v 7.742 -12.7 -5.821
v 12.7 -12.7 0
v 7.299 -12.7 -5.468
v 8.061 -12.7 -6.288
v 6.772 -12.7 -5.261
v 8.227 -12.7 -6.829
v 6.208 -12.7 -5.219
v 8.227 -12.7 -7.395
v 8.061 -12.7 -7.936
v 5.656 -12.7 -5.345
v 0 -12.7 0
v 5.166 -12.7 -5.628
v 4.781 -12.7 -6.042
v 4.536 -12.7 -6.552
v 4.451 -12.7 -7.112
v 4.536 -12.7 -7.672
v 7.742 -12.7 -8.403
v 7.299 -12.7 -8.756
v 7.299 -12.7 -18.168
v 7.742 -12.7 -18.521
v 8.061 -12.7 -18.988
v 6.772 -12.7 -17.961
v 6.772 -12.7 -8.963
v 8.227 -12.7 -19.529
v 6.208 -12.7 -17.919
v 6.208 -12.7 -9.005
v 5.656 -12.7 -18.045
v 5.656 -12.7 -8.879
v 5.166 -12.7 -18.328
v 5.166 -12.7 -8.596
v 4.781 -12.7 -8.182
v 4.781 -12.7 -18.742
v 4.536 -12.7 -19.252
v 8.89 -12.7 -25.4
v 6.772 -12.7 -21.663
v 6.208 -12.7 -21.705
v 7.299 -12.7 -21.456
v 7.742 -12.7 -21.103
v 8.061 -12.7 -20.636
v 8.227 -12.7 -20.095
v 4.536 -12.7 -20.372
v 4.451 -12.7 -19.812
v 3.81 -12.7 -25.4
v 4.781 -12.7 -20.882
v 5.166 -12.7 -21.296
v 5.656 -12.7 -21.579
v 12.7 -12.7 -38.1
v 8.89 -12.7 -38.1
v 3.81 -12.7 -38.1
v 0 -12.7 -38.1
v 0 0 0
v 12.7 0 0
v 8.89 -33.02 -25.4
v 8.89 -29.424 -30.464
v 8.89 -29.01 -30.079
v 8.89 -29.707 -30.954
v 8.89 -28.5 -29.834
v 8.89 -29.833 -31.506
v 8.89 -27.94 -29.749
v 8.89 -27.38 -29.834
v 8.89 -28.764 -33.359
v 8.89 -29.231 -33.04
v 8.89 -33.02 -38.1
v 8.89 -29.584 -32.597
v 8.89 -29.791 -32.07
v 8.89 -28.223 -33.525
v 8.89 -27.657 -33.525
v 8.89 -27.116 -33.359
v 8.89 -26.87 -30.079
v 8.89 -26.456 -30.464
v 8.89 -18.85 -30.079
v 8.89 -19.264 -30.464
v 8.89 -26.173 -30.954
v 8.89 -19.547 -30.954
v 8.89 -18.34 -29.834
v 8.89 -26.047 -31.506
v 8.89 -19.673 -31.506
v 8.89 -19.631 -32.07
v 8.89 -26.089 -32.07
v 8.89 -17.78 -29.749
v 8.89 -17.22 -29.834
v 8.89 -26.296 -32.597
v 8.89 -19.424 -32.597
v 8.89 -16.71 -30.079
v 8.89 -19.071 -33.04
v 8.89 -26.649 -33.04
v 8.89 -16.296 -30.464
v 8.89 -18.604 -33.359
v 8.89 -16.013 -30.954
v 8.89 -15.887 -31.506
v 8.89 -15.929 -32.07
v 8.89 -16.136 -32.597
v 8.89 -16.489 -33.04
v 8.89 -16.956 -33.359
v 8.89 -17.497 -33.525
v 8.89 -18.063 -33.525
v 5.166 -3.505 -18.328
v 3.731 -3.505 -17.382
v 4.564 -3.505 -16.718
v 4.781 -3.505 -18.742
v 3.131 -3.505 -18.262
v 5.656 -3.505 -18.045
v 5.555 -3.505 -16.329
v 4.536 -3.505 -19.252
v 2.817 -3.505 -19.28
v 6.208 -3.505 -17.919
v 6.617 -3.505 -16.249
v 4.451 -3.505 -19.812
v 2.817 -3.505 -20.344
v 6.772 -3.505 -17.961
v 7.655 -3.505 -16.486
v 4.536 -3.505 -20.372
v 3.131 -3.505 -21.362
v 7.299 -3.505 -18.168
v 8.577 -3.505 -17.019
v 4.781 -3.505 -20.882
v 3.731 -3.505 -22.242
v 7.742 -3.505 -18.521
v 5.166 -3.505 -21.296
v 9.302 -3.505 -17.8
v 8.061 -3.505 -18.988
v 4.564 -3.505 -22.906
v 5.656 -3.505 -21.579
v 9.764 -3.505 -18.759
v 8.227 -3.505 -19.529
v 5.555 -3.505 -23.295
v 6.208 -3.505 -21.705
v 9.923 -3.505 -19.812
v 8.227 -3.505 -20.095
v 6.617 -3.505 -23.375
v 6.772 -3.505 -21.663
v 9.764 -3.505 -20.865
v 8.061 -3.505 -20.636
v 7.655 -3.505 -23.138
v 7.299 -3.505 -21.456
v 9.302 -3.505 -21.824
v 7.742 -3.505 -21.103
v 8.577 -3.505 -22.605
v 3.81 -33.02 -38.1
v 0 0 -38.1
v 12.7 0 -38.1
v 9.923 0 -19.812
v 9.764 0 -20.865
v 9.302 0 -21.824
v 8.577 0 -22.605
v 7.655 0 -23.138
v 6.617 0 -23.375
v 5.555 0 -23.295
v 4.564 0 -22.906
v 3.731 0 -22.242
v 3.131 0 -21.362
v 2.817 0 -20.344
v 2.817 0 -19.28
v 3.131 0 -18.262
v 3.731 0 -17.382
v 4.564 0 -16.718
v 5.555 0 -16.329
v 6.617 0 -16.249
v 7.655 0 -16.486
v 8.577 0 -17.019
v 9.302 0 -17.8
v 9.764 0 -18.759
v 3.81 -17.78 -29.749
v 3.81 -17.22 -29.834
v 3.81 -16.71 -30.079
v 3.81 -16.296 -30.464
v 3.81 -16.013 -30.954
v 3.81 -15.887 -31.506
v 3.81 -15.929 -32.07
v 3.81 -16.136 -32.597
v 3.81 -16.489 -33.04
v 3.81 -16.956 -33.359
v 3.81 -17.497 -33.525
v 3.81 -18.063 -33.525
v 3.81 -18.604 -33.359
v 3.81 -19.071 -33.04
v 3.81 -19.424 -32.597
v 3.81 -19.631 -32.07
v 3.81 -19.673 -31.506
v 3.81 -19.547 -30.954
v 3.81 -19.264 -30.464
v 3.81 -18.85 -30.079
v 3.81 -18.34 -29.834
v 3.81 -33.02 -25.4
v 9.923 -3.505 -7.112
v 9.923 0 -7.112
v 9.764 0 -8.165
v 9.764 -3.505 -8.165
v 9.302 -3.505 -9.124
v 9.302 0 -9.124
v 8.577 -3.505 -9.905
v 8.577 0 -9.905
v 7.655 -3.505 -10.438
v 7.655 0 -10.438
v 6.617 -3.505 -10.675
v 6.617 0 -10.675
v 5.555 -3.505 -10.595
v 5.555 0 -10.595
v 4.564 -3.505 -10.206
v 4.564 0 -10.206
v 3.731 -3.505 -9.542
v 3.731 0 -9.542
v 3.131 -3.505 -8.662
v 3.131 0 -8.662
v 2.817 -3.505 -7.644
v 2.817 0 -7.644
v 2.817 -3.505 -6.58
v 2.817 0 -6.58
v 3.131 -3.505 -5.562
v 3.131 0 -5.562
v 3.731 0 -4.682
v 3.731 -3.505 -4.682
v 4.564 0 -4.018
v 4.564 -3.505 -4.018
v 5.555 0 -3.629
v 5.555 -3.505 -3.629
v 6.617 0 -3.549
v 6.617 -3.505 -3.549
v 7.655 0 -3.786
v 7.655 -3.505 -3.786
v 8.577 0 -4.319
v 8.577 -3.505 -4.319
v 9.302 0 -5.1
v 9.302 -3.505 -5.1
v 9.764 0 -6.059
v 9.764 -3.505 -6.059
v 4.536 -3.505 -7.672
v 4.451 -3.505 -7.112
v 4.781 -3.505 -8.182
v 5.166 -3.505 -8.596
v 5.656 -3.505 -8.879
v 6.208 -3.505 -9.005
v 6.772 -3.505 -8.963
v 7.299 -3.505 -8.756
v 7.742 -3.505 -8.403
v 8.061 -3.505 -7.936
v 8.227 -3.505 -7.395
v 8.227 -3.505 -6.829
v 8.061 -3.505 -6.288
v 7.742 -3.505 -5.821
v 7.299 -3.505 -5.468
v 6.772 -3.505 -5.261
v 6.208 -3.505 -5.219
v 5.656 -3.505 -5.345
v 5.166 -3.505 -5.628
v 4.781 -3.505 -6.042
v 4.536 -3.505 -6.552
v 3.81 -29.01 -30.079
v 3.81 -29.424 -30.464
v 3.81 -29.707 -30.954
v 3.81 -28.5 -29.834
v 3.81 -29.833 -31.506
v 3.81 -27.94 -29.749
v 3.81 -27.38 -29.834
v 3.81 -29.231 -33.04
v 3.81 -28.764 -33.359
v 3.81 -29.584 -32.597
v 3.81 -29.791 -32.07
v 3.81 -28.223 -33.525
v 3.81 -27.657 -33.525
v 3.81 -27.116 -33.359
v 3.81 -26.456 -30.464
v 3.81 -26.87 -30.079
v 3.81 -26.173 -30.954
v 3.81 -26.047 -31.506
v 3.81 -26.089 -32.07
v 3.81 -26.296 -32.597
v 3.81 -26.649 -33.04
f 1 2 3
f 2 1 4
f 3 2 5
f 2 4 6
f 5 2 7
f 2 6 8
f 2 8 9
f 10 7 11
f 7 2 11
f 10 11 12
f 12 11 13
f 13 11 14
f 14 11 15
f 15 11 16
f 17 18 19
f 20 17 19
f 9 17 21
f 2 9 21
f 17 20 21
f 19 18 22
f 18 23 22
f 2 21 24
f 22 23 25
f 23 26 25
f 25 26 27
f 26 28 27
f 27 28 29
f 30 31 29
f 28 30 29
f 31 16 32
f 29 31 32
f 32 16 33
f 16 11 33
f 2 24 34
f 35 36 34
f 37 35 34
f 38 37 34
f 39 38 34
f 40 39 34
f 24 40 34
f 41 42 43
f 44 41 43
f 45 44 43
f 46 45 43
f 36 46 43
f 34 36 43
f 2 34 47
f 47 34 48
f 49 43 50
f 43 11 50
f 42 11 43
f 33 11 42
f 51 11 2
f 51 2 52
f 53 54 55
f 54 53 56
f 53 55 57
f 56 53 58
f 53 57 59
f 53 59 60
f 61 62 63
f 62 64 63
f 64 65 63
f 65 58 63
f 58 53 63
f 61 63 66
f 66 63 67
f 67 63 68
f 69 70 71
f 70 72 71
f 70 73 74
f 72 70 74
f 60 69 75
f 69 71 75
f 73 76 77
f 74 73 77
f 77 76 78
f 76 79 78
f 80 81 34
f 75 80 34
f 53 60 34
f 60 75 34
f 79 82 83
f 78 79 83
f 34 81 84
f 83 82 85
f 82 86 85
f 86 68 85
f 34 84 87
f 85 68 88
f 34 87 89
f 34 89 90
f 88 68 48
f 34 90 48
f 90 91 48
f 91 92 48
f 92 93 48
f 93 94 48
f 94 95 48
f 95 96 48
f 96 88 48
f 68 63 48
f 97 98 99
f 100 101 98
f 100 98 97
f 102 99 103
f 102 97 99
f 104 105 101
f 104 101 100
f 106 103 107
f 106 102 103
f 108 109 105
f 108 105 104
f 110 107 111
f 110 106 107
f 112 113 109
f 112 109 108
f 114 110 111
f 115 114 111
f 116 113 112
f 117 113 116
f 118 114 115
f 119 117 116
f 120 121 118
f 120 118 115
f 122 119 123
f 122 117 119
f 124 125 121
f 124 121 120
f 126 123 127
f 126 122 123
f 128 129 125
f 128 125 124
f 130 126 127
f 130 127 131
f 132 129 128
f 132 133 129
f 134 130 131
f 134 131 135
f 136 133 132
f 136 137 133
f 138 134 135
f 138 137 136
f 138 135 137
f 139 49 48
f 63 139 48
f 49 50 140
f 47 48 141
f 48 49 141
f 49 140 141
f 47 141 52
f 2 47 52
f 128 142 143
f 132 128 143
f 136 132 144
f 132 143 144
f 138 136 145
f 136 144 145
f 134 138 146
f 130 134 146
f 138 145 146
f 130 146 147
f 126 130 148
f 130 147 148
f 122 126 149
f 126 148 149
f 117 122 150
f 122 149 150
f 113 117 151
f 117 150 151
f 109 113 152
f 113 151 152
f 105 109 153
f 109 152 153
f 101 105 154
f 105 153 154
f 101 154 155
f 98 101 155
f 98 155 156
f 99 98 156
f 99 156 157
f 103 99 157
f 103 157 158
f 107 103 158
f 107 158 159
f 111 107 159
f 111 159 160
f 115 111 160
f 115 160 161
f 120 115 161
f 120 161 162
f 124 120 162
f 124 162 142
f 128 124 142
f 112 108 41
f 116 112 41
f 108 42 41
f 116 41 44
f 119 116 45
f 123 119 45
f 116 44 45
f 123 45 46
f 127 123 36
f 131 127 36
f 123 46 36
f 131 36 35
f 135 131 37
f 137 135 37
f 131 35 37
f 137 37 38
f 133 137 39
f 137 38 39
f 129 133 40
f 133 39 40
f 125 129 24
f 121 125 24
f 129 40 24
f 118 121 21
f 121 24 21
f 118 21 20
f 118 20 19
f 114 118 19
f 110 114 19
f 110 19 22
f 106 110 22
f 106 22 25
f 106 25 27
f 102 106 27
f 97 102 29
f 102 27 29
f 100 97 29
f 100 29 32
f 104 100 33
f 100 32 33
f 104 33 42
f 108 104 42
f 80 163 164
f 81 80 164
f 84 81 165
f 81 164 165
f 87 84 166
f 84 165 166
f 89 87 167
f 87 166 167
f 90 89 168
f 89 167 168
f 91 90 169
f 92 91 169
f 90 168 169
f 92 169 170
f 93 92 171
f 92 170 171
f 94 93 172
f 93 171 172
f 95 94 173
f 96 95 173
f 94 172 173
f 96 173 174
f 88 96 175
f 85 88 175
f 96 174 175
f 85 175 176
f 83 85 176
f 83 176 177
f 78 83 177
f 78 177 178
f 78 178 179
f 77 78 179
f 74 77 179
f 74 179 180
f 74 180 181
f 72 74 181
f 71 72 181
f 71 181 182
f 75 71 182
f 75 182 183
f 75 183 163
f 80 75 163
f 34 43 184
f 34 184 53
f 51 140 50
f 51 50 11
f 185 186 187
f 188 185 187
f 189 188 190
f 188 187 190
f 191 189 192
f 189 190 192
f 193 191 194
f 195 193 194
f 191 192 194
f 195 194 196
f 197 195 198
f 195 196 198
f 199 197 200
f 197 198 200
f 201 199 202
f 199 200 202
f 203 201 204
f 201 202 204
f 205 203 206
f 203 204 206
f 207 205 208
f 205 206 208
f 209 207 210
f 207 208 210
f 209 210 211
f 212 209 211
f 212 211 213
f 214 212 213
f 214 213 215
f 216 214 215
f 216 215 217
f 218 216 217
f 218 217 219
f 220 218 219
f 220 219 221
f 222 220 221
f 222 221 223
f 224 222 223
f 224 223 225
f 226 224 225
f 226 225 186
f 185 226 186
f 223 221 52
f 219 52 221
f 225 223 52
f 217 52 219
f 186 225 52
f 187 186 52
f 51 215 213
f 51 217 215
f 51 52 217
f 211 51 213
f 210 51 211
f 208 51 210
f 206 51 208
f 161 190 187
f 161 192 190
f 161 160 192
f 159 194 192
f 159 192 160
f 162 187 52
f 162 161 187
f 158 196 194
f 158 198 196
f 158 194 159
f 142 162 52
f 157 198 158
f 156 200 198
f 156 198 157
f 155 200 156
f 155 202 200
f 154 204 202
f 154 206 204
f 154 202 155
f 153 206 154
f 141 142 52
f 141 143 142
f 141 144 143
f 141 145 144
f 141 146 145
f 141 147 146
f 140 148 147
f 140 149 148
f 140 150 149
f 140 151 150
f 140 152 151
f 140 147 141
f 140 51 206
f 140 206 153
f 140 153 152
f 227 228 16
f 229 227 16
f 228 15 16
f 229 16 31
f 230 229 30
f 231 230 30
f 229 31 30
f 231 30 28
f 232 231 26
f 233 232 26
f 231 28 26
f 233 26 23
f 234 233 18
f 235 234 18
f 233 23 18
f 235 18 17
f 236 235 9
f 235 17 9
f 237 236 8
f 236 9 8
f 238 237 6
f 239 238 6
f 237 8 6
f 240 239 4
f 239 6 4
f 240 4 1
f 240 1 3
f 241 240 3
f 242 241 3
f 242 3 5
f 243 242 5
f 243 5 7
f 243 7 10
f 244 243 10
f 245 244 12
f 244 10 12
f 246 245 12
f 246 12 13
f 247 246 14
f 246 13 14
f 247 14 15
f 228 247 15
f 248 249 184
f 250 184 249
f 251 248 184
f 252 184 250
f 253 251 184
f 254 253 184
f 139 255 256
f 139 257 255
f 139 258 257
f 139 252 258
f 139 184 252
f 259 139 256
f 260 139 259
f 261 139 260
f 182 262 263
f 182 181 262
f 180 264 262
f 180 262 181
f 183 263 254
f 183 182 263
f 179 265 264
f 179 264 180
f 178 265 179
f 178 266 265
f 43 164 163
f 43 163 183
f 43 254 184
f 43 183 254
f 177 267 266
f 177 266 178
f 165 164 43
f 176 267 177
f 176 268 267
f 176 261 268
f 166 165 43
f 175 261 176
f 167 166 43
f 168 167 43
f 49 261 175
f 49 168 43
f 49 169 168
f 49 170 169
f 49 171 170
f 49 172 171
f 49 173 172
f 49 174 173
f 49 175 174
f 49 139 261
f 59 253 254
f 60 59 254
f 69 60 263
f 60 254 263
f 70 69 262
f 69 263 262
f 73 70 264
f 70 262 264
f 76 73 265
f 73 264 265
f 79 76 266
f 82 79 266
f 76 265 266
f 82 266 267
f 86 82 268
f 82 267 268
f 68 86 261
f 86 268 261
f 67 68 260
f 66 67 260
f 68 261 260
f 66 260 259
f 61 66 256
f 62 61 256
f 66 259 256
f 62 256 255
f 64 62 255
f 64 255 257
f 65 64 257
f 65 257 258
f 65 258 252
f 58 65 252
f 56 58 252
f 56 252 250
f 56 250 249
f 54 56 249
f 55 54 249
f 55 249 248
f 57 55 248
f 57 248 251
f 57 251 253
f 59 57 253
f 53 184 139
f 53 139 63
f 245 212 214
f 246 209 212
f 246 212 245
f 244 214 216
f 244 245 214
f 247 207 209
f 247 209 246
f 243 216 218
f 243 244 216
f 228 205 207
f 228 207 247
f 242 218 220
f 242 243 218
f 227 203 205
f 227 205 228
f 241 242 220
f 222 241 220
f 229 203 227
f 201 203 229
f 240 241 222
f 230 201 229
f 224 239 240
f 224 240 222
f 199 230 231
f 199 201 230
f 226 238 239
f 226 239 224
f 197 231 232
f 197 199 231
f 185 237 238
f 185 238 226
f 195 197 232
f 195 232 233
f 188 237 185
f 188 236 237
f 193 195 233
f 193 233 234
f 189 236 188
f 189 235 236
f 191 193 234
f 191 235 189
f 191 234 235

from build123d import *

# Parameters (mm, degrees)
SKETCH1_W                                      = 38.1
SKETCH1_H                                      = 12.7
BOSS_EXTRUDE1_DEPTH                            = 12.7
SKETCH2_W                                      = 12.7
SKETCH2_H                                      = 12.7
BOSS_EXTRUDE2_DEPTH                            = 20.32
SKETCH3_W                                      = 3.81
SKETCH3_H                                      = 20.32
CUT_EXTRUDE1_DEPTH                             = 12.7
F_6_CLEARANCE_HOLE1_D                          = 3.7973
F_6_CLEARANCE_HOLE1_DEPTH                      = 10.16
F_6_CLEARANCE_HOLE1_TIP                        = 1.140824014
CBORE_FOR_6_SOCKET_HEAD_CAP_SCREW1_D           = 3.7973
CBORE_FOR_6_SOCKET_HEAD_CAP_SCREW1_CBORE_D     = 7.14502
CBORE_FOR_6_SOCKET_HEAD_CAP_SCREW1_CBORE_DEPTH = 3.5052


with BuildPart() as part:
    # Sketch1 → Boss-Extrude1 (new body)
    with BuildSketch(Plane(origin=(0, 0, 0), x_dir=(0, 0, -1), z_dir=(1, 0, 0))):
        with Locations((19.05, -6.35)):
            Rectangle(SKETCH1_W, SKETCH1_H)
    extrude(amount=BOSS_EXTRUDE1_DEPTH)

    # Sketch2 → Boss-Extrude2 (add)
    with BuildSketch(Plane.XZ.offset(12.7)):
        with Locations((6.35, -31.75)):
            Rectangle(SKETCH2_W, SKETCH2_H)
    extrude(amount=BOSS_EXTRUDE2_DEPTH)

    # Sketch3 → Cut-Extrude1 (cut)
    with BuildSketch(Plane(origin=(0, 0, -38.1), x_dir=(-1, 0, 0), z_dir=(0, 0, -1))):
        with Locations((-10.795, -22.86)):
            Rectangle(SKETCH3_W, SKETCH3_H)
        with Locations((-1.905, -22.86)):
            Rectangle(SKETCH3_W, SKETCH3_H)
    extrude(amount=-CUT_EXTRUDE1_DEPTH, mode=Mode.SUBTRACT)

    # #6 Clearance Hole1
    with Locations(Plane(origin=(8.89, 0, 0), x_dir=(0, 0, -1), z_dir=(1, 0, 0))):
        with Locations((31.647977642, -17.78), (31.647977642, -27.94), (44.509550176, -23.706107059)):
            Hole(F_6_CLEARANCE_HOLE1_D / 2, depth=F_6_CLEARANCE_HOLE1_DEPTH)
            with Locations((0, 0, -(F_6_CLEARANCE_HOLE1_DEPTH + F_6_CLEARANCE_HOLE1_TIP / 2))):  # 118° drill point
                Cone(0, F_6_CLEARANCE_HOLE1_D / 2, F_6_CLEARANCE_HOLE1_TIP, mode=Mode.SUBTRACT)

    # CBORE for #6 Socket Head Cap Screw1 (through all)
    with Locations(Plane(origin=(0, 0, 0), x_dir=(1, 0, 0), z_dir=(0, 1, 0))):
        with Locations((6.35, 7.112), (6.35, 19.812)):
            CounterBoreHole(CBORE_FOR_6_SOCKET_HEAD_CAP_SCREW1_D / 2, CBORE_FOR_6_SOCKET_HEAD_CAP_SCREW1_CBORE_D / 2, CBORE_FOR_6_SOCKET_HEAD_CAP_SCREW1_CBORE_DEPTH)


solid = part.part
